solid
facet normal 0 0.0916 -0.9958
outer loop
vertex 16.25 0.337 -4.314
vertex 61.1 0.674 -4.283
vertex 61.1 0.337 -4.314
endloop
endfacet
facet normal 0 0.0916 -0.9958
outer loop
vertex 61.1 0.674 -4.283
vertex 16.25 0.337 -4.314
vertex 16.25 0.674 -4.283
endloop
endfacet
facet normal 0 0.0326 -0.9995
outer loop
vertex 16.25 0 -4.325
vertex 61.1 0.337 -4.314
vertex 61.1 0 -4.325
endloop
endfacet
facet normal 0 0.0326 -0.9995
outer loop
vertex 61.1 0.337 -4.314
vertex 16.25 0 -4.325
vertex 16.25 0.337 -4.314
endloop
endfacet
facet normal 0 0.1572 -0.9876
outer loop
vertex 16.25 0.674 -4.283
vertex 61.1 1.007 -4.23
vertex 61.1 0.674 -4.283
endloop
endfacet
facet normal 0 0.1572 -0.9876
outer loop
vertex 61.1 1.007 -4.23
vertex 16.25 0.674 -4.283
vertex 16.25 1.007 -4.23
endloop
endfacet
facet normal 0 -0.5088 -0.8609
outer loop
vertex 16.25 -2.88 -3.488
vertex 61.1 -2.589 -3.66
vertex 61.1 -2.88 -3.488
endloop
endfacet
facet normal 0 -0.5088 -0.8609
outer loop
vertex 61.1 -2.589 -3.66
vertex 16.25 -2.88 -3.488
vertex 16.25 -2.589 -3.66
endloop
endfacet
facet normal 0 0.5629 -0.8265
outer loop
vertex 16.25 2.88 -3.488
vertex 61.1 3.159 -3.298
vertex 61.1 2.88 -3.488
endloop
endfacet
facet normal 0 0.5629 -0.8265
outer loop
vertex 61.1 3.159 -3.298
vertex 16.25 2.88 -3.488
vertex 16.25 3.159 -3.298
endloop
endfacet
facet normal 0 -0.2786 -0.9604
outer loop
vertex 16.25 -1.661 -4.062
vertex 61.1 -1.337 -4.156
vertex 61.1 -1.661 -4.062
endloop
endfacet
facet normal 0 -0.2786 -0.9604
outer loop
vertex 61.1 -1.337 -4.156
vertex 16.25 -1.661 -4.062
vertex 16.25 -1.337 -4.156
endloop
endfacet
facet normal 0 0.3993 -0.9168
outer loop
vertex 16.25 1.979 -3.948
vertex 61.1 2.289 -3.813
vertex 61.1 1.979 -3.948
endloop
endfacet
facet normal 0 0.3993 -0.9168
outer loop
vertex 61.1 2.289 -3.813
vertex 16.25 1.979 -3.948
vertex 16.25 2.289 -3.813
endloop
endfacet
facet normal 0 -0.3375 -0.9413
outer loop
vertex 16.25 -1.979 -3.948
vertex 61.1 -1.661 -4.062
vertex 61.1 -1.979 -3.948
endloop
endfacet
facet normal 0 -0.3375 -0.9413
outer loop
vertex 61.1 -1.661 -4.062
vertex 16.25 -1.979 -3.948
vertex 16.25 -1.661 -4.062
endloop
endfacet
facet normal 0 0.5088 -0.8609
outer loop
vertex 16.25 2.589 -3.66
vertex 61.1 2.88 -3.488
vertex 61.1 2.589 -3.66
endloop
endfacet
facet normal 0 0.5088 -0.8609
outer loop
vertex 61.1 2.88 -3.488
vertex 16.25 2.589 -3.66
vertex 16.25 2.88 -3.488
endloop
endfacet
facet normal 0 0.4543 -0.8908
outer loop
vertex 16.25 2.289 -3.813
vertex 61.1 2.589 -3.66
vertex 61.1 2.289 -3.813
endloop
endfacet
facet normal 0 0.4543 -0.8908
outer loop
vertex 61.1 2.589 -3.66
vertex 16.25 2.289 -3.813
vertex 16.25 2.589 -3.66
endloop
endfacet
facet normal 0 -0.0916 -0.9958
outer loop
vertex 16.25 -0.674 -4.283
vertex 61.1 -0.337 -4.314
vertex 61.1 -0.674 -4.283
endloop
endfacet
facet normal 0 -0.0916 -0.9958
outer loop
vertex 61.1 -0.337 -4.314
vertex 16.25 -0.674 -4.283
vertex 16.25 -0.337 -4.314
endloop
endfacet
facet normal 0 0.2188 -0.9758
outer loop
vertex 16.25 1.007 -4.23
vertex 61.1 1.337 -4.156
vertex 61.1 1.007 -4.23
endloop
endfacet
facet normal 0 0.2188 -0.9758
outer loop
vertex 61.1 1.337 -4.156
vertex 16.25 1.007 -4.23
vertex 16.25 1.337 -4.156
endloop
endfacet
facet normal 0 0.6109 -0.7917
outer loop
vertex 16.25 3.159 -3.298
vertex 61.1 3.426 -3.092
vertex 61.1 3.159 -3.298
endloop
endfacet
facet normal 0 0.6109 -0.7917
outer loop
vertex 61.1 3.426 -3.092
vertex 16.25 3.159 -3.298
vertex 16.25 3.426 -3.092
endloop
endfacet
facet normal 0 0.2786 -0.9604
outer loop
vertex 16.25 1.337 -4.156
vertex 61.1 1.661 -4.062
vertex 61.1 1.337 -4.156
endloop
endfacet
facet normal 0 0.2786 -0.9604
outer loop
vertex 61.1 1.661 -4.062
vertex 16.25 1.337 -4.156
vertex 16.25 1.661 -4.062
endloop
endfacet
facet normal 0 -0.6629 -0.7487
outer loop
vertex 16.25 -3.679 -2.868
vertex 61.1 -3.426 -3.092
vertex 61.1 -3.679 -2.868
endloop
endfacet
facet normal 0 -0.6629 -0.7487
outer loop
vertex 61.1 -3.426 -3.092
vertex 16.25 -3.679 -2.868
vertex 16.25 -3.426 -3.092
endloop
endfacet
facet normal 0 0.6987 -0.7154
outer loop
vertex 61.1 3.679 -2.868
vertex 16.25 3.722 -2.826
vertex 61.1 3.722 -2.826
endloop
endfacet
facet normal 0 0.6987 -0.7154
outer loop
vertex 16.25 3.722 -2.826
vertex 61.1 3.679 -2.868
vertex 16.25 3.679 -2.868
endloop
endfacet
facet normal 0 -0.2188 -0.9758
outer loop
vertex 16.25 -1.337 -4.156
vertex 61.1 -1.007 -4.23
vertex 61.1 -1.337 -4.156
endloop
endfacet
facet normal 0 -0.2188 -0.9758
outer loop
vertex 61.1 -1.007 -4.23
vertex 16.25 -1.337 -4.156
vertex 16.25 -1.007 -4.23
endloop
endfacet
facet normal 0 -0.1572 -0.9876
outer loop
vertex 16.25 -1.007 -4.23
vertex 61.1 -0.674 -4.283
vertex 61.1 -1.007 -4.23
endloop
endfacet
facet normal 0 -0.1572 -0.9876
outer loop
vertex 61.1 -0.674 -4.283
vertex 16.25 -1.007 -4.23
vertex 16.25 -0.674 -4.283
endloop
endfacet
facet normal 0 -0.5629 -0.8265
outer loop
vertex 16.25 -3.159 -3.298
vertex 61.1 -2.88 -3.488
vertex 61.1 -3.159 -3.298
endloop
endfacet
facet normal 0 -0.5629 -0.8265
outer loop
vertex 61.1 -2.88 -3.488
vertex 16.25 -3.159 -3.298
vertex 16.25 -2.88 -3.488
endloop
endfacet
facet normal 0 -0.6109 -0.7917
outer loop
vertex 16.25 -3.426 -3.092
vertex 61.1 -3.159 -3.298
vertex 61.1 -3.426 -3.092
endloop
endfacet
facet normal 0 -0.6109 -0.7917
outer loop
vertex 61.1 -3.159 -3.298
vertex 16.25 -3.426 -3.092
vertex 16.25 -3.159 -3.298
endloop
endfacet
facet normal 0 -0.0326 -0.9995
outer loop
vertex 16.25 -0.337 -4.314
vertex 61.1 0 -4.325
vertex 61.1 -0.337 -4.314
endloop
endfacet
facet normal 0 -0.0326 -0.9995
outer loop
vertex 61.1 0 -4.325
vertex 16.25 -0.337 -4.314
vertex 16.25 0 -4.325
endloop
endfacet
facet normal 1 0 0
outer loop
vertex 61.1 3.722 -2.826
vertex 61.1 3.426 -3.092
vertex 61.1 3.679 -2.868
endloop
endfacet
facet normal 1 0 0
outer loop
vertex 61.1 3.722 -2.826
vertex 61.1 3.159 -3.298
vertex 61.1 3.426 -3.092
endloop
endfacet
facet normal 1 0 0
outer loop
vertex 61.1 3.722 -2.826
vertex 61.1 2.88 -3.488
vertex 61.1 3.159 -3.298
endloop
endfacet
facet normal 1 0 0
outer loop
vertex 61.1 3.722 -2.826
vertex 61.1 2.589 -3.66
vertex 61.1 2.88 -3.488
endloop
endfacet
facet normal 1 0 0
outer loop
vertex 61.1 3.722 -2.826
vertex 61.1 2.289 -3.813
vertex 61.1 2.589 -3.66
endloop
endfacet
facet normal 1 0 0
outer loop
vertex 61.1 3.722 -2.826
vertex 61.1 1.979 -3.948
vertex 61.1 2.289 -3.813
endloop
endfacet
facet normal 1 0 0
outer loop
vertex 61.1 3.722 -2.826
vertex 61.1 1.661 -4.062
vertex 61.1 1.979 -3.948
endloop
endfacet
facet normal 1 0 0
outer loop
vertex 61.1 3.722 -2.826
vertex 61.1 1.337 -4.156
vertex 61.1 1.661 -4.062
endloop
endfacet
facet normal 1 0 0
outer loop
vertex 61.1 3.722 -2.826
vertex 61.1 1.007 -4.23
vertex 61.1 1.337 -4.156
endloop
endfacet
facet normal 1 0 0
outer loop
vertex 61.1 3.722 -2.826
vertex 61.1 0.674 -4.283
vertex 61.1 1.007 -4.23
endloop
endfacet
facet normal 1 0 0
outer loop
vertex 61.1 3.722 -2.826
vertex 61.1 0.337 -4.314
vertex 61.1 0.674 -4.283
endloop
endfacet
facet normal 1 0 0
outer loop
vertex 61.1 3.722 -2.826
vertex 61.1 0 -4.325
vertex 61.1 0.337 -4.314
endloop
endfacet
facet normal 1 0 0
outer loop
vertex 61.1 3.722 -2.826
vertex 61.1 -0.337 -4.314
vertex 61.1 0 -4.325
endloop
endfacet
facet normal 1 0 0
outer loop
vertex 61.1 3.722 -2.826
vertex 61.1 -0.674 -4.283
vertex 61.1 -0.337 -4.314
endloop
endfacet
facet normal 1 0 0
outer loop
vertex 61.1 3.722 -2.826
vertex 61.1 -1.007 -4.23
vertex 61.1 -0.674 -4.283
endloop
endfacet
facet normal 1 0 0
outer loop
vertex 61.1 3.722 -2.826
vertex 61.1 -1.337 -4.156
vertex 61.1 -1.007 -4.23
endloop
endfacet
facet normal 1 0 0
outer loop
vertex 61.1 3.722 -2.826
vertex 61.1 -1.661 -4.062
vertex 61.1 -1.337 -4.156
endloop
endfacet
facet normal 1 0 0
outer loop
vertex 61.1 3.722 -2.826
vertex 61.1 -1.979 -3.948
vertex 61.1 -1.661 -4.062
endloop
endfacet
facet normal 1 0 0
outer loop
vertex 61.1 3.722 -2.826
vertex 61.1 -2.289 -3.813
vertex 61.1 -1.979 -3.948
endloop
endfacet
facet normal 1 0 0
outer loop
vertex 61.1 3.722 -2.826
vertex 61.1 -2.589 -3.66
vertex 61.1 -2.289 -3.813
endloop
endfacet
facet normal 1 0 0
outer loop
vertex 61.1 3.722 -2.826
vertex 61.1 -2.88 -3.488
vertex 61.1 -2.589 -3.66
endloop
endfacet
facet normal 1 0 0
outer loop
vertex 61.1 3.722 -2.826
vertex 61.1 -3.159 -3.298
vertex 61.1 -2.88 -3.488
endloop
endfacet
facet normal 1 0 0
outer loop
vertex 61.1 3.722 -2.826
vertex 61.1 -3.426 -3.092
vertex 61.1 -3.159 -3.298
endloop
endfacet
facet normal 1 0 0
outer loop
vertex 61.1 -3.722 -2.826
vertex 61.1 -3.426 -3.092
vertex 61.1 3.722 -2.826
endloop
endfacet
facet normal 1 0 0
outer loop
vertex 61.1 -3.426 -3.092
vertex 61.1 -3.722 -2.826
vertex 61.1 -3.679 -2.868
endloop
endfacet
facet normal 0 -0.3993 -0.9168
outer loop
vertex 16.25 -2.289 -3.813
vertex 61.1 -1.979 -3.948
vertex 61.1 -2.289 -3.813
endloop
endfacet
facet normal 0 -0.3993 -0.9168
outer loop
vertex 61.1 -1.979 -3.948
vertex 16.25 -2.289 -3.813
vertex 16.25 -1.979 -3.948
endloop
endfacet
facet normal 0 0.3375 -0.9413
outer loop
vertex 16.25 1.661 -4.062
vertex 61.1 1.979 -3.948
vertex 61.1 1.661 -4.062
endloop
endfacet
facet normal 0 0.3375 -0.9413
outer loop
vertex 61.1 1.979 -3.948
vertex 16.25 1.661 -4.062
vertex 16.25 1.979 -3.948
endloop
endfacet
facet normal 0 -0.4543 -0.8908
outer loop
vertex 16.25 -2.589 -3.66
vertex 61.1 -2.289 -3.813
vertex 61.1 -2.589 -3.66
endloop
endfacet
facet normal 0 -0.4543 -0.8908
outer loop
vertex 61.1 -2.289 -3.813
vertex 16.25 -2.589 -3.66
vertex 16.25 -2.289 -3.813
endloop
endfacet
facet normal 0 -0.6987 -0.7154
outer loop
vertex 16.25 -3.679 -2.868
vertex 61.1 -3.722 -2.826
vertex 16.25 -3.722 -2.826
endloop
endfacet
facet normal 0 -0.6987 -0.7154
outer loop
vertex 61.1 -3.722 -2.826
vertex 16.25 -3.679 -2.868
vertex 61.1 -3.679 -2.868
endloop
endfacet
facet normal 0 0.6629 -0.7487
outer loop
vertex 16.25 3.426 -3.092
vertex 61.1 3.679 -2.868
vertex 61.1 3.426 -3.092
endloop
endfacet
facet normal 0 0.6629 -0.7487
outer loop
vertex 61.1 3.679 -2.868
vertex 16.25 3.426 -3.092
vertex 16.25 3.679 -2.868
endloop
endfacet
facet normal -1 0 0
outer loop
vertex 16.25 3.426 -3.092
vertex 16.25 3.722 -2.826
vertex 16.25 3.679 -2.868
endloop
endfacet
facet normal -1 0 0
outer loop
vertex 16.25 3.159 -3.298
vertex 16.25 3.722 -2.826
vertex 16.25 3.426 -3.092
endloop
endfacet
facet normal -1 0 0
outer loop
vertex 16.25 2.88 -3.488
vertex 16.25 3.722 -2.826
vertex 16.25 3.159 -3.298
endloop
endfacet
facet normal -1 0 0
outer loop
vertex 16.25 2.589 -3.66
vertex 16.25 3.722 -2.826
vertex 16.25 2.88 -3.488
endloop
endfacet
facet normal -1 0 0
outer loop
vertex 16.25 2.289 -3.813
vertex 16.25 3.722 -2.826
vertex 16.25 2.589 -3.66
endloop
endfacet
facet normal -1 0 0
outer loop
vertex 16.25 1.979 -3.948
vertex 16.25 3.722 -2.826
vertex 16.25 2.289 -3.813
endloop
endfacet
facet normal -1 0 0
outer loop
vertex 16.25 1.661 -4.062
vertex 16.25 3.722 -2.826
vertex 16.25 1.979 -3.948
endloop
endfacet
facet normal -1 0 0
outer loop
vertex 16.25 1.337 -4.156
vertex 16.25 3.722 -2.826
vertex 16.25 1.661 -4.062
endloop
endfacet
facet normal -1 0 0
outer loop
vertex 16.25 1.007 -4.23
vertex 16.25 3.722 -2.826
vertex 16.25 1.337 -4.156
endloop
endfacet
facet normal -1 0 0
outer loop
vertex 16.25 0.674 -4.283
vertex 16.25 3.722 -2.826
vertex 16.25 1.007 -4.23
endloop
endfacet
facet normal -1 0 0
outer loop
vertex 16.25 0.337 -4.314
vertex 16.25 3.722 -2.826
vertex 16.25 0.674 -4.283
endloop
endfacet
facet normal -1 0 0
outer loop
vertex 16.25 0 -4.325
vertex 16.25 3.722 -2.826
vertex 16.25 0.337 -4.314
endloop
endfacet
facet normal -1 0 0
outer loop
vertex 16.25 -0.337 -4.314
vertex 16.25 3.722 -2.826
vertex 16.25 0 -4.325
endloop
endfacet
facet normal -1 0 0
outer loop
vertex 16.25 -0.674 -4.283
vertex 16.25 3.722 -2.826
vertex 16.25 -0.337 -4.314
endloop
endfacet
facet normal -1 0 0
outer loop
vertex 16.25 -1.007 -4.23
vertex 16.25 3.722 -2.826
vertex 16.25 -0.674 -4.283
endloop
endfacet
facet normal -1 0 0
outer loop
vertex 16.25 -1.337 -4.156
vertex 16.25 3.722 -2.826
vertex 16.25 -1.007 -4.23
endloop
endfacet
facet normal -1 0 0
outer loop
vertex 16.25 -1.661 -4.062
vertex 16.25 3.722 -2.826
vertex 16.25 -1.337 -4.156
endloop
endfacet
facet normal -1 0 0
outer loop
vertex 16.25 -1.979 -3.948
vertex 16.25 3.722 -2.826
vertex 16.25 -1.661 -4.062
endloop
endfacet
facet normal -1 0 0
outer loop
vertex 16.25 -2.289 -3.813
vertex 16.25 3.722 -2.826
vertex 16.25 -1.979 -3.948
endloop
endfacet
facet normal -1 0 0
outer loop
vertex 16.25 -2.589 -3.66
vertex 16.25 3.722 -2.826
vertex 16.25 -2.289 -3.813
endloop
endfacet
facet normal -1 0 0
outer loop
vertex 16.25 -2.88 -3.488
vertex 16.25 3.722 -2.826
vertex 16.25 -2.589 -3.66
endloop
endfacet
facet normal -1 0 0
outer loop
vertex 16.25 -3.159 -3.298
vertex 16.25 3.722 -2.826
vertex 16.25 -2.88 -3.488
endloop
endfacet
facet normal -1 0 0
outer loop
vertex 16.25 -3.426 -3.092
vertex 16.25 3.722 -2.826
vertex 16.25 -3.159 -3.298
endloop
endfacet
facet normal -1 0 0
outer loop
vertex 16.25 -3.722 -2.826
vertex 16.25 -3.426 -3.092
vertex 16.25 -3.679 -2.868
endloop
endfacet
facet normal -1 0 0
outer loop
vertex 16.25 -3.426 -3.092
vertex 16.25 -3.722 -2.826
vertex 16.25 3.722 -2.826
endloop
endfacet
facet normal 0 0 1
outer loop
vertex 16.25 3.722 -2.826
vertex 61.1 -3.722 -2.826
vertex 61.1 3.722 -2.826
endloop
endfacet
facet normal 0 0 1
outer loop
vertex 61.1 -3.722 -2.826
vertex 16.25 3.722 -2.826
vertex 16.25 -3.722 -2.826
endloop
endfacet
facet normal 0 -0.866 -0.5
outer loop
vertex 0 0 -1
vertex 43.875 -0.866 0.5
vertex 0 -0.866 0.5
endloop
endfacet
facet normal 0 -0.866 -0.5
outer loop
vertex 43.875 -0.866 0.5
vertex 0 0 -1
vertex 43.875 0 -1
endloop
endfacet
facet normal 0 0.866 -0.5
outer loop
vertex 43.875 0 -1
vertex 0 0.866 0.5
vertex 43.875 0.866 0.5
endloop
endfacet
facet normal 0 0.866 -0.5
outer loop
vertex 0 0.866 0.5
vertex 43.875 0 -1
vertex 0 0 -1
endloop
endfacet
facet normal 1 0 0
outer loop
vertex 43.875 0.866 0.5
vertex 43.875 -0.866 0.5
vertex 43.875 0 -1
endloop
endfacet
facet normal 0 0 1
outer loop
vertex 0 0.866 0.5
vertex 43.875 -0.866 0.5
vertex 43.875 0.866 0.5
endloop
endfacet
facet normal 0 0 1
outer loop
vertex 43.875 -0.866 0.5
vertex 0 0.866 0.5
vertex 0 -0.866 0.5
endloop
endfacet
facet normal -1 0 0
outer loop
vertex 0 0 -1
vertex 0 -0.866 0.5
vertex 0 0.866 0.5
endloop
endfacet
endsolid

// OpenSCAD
// file: reed/BOSL2/std.scad
// Minimal BOSL2 compatibility shim for bundled gallery models.
// It implements only the helpers used by the imported OpenSCAD projects.

CENTER = [0, 0, 0];
BOTTOM = [0, 0, -1];
TOP = [0, 0, 1];
LEFT = [-1, 0, 0];
RIGHT = [1, 0, 0];
FRONT = [0, -1, 0];
BACK = [0, 1, 0];

module up(z=0) {
    translate([0, 0, z]) children();
}

module down(z=0) {
    translate([0, 0, -z]) children();
}

module attach(anchor=CENTER) {
    children();
}

module cuboid(size=[1, 1, 1], anchor=CENTER) {
    center = anchor == CENTER;
    translate(center ? [0, 0, 0] : [0, 0, size[2] / 2])
        cube(size, center=true);
    children();
}

module xcyl(h=1, r=1, anchor=CENTER) {
    center = anchor == CENTER;
    translate(center ? [0, 0, 0] : [h / 2, 0, 0])
        rotate([0, 90, 0])
            cylinder(h=h, r=r, center=true);
}
// file: reed/reed.scad
use <BOSL2/std.scad>

holder_completeness_percent = 33;

module pipe(length, outer_diameter, thickness, cap=0, center=true){
    if(cap == 0){
        difference(){
            cylinder(h=length, d=outer_diameter, center = center);
            translate([0,0,-0.1*length]) cylinder(h=length*1.3, d=outer_diameter-thickness*2, center = center);
        }
    } else {
        difference(){
            cylinder(h=length, d=outer_diameter, center = center);
            translate([0,0,-cap]) cylinder(h=length, d=outer_diameter-thickness*2, center = center);
        }
    }
}

module partial_pipe(length, outer_diameter, thickness, completeness_percent=33){
    echo(str("partial_pipe(", length, ", ", outer_diameter, ", ", thickness, ", ", completeness_percent));
    difference(){
        rotate_extrude(angle=completeness_percent*360/100, convexity = 2){
            translate([0.01, 0, 0]) square([outer_diameter/2 - 0.01, length], center = false);
        }
        translate([0,0,-0.1*length]) cylinder(h=length*1.2,d=outer_diameter - thickness*2, center = false);
    }
}

module reed_burdon_ending(total_length, end_length, d) {
    // pogrubienie przy mocowaniu
    translate([0,0,-end_length]){
        flute_count = 5;
        union() {
            difference() { // stożek
                cylinder(h=end_length,r2=d/2,r1=d/2*0.75,center=false);
                translate([0,0,-end_length*0.05]) cylinder(h=end_length*1.1,r2=d/2*0.8,r1=d/2*0.65,center=false);
            }
            // for(i=[1:flute_count]){ //karbowanie
            //     translate([0,0,(i-1)*end_length/flute_count]){
            //         pipe(length=end_length/flute_count/2, outer_diameter=d*lerp(0.80, 1.1, i/flute_count), thickness=0.6, center=false);
            //         // echo(i*end_length/flute_count);
            //     }
            // } //karby
        } // karbowanie
    } // pogrubienie
}

module reed_ending(total_length, end_length, d) {
    wall_thickness = d * 0.11;
    translate([0,0,-end_length]){
        flute_count = 5;
        union() {
            difference() { // stożek
                cylinder(h=end_length,r1=d/2-wall_thickness+0.4,r2=d/2);
                translate([0,0,-end_length*0.05]) cylinder(h=end_length*1.1,r1=d/2-wall_thickness,r2=d/2-wall_thickness);
            }
            // for(i=[1:flute_count]){ //karbowanie
            //     translate([0,0,(i-1)*end_length/flute_count]){
            //         pipe(length=end_length/flute_count/2, outer_diameter=d+2*wall_thickness, thickness=0.6, center=false);
            //         // echo(i*end_length/flute_count);
            //     }
            // } //karby
        } // karbowanie
    } // pogrubienie
}

module reed_base(total_length, end_length, d){
    translate([0, 0, end_length]) {
        // główny cylinder
        cylinder(h=total_length - end_length, d=d);
        reed_ending(total_length, end_length, d);
    } // wyrównanie po dodaniu końcówki
}
// file: variants_2_0_0.scad
// lengths = [65, 70, 75];
// diameters = [4, 5, 6, 7, 8];

// lengths = [65, 70];
// diameters = [5, 6];

lengths = [65];
// diameters = [5, 6, 7];
diameters = [7];


heigth_cut_prcnt = [12];
leaf_degrees = [1];
variants2 = [for(l=lengths) for(d=diameters) for(h=heigth_cut_prcnt) for(ld=leaf_degrees) [l, l/80*20, d, h, ld]];

echo(str("There is ", len(variants2), " variants"));
// file: reed/reed_2_0_0.scad
include <reed.scad>

completeness_percent = 25;
wall_thickness = 0.8;
reed_plug_overhang_suppressor_len = 2;
eps = 0.01;

module reed_plug(total_length, end_length, d) {
    d_out = d+wall_thickness*2;

    translate([0,0,-end_length]){
        difference() {
            cylinder(h=end_length,d2=d_out*1.1,d1=d+0.8);
            translate([0,0,-eps/2]) cylinder(h=end_length+eps,d=d);
        }
    }

    // // anti overhanger
    // translate([0,0,0]) {
    //     difference() {
    //         cylinder(h=reed_plug_overhang_suppressor_len,d1=d_out*1.1,d2=d+0.8);
    //         translate([0,0,-eps/2]) cylinder(h=2+eps,d=d);
    //     }
    // }
}

module reed2_base(total_length, end_length, d){
    d_out = d+wall_thickness*2;
    translate([0, 0, end_length]) {
        difference() {
            cylinder(h=total_length - end_length, d=d_out);
            translate([0, 0, -0.1]) cylinder(h = (total_length - end_length)*0.9, d = d);
        }
    } 
}

module reed2_leaf_socket(heigth_cut_prcnt, d, total_length) {
    d_out = d+wall_thickness*2;
    // deepens the cut, for more secure leaf hold
    translate([-heigth_cut_prcnt/120 * d_out, 0, 0]) cube(size=[heigth_cut_prcnt/50 * d_out * 1.1, d_out*1.1, total_length * 0.1]);
}

module reed2_base_flat_cutting_cube(d, heigth_cut_prcnt, total_length) {
    d_out = d+wall_thickness*2;
    translate([d_out/2 - d_out * heigth_cut_prcnt / 100, -d_out/2, 0.25 * total_length]) {
        cube(size=[d_out, d_out, total_length * 0.80]);
        // reed2_leaf_socket(heigth_cut_prcnt, d, total_length);
    }
}

module reed2_base_flat_cut(total_length, end_length, d, heigth_cut_prcnt) {
    difference(){
        reed2_base(total_length, end_length, d);
        translate([0,0,-0.5]) reed2_base_flat_cutting_cube(d, heigth_cut_prcnt, total_length+2/*a gap for reed fitting*/);
    }
}

module reed2_cut(total_length, d, heigth_cut_prcnt, leaf_degree) {
    d_out = d+2*wall_thickness;
    translate([d_out/2 - d_out * heigth_cut_prcnt / 100 + 0.1/*<- fill the little gap between leaf and reed*/, -d_out/2, 0.35 * total_length]) {
        rotate([0, -leaf_degree, 0]) rotate([180, 90, -90]) {
            rotate_extrude(angle = leaf_degree, $fn=100) {
                rotate([0, 0, 90]) {
                    square([d_out, total_length * 0.70]);
                }
            }
        }
    }
}

module reed2_leaf(total_length, end_length, d, heigth_cut_prcnt, stem_heigth_coeff_init, stem_heigth_coeff) {
    d_out = d+2*wall_thickness;
    leaf_len = (total_length - end_length)*0.9;
    
    // trunk of the leaf ;)
    translate([-d*0.15,0,0]) intersection(){
        cylinder(h=total_length * 0.94, d=d_out*1.25);
        reed2_base_flat_cutting_cube(d_out, heigth_cut_prcnt, total_length);
    }

    // support stem
    translate([d_out/2+leaf_len*stem_heigth_coeff_init/2-d*0.1/2, 0, end_length]) rotate([0,-atan(stem_heigth_coeff_init-stem_heigth_coeff),0]) rotate([0,0,-120]) cylinder(leaf_len, leaf_len*stem_heigth_coeff_init, leaf_len*stem_heigth_coeff, $fn=3);
    
    // text
    // translate([d/2-wall_thickness/6, d/8, end_length]) rotate([180,-90,0]) reed2_text(total_length, end_length, d, heigth_cut_prcnt, "-", wall_thickness);
    
    // // round clip
    // difference() {
    //     rotate([0,0,180-(90)/2*360/100]) translate([0,0,end_length]) partial_pipe(total_length/10, d_out+0.8, 0.6, completeness_percent=90);
    //     rotate([0,0,180-(completeness_percent)/2*360/100]) translate([0,0,end_length]) translate([0,0,-0.05]) partial_pipe(total_length/10+0.1, d_out+0.81, 0.61, completeness_percent=completeness_percent);
    // }
}

module reed2_text(total_length, end_length, d, heigth_cut_prcnt, leaf_degree, wall_thickness) {
    my_text = str("L", total_length, " EL", end_length, " D", d, " HC", heigth_cut_prcnt, " LD", leaf_degree);
    linear_extrude(wall_thickness) text(my_text, size = (total_length - end_length)/24);
}

module reed2(total_length, end_length, d, heigth_cut_prcnt, leaf_degree) {
    halved_leaf_degree = leaf_degree/2;
    d_out = d+2*wall_thickness;

    // first part: plug
    translate([0,0,end_length]) reed_plug(total_length, end_length, d);

    // main part
    difference() {
        reed2_base_flat_cut(total_length, end_length, d, heigth_cut_prcnt); // just a flat cut
        reed2_cut(total_length, d, heigth_cut_prcnt, halved_leaf_degree); // deeper cut, half of the leaf degree is added here
    }

    // // grips

    //     // vertical grip
    //     difference() {
    //         rotate([0,0,180-(completeness_percent)/2*360/100]) translate([0,0,end_length+reed_plug_overhang_suppressor_len]) partial_pipe(total_length/10, d_out+0.8, 0.41, completeness_percent=completeness_percent);
    //         rotate([0,0,180-(completeness_percent-10)/2*360/100]) translate([0,0,end_length+reed_plug_overhang_suppressor_len]) translate([0,0,-0.005]) partial_pipe(total_length/10+0.01, d_out+0.81, 0.41, completeness_percent=completeness_percent-10);
    //     }

        // horizontal grip - powstrzymuje klej!!!
        difference() {
            translate([0,0,end_length+reed_plug_overhang_suppressor_len+total_length/10]) {
                difference() {
                    cylinder(h=reed_plug_overhang_suppressor_len,d1=d_out*1.2,d2=d);
                    translate([0,0,-eps/2]) cylinder(h=2+eps,d=d);
                }
            }
            reed2_base_flat_cutting_cube(d, variants_reed_pipe_cut_prcnt, total_length);
        }
}
// main file
include <reed/reed_2_0_0.scad>
include <variants_2_0_0.scad>

$fn=100;

max_in_a_row = 2;

for (i = [0:len(variants2)-1]){
    v = variants2[i];
    echo(str("variant: ", v));
    translate([(i%max_in_a_row)*v[0]*1.2, (i/max_in_a_row)*v[1], 0]){
        rotate([0, 90, 0]) reed2_leaf(v[0], v[1], v[2], v[3]);
    }
}
